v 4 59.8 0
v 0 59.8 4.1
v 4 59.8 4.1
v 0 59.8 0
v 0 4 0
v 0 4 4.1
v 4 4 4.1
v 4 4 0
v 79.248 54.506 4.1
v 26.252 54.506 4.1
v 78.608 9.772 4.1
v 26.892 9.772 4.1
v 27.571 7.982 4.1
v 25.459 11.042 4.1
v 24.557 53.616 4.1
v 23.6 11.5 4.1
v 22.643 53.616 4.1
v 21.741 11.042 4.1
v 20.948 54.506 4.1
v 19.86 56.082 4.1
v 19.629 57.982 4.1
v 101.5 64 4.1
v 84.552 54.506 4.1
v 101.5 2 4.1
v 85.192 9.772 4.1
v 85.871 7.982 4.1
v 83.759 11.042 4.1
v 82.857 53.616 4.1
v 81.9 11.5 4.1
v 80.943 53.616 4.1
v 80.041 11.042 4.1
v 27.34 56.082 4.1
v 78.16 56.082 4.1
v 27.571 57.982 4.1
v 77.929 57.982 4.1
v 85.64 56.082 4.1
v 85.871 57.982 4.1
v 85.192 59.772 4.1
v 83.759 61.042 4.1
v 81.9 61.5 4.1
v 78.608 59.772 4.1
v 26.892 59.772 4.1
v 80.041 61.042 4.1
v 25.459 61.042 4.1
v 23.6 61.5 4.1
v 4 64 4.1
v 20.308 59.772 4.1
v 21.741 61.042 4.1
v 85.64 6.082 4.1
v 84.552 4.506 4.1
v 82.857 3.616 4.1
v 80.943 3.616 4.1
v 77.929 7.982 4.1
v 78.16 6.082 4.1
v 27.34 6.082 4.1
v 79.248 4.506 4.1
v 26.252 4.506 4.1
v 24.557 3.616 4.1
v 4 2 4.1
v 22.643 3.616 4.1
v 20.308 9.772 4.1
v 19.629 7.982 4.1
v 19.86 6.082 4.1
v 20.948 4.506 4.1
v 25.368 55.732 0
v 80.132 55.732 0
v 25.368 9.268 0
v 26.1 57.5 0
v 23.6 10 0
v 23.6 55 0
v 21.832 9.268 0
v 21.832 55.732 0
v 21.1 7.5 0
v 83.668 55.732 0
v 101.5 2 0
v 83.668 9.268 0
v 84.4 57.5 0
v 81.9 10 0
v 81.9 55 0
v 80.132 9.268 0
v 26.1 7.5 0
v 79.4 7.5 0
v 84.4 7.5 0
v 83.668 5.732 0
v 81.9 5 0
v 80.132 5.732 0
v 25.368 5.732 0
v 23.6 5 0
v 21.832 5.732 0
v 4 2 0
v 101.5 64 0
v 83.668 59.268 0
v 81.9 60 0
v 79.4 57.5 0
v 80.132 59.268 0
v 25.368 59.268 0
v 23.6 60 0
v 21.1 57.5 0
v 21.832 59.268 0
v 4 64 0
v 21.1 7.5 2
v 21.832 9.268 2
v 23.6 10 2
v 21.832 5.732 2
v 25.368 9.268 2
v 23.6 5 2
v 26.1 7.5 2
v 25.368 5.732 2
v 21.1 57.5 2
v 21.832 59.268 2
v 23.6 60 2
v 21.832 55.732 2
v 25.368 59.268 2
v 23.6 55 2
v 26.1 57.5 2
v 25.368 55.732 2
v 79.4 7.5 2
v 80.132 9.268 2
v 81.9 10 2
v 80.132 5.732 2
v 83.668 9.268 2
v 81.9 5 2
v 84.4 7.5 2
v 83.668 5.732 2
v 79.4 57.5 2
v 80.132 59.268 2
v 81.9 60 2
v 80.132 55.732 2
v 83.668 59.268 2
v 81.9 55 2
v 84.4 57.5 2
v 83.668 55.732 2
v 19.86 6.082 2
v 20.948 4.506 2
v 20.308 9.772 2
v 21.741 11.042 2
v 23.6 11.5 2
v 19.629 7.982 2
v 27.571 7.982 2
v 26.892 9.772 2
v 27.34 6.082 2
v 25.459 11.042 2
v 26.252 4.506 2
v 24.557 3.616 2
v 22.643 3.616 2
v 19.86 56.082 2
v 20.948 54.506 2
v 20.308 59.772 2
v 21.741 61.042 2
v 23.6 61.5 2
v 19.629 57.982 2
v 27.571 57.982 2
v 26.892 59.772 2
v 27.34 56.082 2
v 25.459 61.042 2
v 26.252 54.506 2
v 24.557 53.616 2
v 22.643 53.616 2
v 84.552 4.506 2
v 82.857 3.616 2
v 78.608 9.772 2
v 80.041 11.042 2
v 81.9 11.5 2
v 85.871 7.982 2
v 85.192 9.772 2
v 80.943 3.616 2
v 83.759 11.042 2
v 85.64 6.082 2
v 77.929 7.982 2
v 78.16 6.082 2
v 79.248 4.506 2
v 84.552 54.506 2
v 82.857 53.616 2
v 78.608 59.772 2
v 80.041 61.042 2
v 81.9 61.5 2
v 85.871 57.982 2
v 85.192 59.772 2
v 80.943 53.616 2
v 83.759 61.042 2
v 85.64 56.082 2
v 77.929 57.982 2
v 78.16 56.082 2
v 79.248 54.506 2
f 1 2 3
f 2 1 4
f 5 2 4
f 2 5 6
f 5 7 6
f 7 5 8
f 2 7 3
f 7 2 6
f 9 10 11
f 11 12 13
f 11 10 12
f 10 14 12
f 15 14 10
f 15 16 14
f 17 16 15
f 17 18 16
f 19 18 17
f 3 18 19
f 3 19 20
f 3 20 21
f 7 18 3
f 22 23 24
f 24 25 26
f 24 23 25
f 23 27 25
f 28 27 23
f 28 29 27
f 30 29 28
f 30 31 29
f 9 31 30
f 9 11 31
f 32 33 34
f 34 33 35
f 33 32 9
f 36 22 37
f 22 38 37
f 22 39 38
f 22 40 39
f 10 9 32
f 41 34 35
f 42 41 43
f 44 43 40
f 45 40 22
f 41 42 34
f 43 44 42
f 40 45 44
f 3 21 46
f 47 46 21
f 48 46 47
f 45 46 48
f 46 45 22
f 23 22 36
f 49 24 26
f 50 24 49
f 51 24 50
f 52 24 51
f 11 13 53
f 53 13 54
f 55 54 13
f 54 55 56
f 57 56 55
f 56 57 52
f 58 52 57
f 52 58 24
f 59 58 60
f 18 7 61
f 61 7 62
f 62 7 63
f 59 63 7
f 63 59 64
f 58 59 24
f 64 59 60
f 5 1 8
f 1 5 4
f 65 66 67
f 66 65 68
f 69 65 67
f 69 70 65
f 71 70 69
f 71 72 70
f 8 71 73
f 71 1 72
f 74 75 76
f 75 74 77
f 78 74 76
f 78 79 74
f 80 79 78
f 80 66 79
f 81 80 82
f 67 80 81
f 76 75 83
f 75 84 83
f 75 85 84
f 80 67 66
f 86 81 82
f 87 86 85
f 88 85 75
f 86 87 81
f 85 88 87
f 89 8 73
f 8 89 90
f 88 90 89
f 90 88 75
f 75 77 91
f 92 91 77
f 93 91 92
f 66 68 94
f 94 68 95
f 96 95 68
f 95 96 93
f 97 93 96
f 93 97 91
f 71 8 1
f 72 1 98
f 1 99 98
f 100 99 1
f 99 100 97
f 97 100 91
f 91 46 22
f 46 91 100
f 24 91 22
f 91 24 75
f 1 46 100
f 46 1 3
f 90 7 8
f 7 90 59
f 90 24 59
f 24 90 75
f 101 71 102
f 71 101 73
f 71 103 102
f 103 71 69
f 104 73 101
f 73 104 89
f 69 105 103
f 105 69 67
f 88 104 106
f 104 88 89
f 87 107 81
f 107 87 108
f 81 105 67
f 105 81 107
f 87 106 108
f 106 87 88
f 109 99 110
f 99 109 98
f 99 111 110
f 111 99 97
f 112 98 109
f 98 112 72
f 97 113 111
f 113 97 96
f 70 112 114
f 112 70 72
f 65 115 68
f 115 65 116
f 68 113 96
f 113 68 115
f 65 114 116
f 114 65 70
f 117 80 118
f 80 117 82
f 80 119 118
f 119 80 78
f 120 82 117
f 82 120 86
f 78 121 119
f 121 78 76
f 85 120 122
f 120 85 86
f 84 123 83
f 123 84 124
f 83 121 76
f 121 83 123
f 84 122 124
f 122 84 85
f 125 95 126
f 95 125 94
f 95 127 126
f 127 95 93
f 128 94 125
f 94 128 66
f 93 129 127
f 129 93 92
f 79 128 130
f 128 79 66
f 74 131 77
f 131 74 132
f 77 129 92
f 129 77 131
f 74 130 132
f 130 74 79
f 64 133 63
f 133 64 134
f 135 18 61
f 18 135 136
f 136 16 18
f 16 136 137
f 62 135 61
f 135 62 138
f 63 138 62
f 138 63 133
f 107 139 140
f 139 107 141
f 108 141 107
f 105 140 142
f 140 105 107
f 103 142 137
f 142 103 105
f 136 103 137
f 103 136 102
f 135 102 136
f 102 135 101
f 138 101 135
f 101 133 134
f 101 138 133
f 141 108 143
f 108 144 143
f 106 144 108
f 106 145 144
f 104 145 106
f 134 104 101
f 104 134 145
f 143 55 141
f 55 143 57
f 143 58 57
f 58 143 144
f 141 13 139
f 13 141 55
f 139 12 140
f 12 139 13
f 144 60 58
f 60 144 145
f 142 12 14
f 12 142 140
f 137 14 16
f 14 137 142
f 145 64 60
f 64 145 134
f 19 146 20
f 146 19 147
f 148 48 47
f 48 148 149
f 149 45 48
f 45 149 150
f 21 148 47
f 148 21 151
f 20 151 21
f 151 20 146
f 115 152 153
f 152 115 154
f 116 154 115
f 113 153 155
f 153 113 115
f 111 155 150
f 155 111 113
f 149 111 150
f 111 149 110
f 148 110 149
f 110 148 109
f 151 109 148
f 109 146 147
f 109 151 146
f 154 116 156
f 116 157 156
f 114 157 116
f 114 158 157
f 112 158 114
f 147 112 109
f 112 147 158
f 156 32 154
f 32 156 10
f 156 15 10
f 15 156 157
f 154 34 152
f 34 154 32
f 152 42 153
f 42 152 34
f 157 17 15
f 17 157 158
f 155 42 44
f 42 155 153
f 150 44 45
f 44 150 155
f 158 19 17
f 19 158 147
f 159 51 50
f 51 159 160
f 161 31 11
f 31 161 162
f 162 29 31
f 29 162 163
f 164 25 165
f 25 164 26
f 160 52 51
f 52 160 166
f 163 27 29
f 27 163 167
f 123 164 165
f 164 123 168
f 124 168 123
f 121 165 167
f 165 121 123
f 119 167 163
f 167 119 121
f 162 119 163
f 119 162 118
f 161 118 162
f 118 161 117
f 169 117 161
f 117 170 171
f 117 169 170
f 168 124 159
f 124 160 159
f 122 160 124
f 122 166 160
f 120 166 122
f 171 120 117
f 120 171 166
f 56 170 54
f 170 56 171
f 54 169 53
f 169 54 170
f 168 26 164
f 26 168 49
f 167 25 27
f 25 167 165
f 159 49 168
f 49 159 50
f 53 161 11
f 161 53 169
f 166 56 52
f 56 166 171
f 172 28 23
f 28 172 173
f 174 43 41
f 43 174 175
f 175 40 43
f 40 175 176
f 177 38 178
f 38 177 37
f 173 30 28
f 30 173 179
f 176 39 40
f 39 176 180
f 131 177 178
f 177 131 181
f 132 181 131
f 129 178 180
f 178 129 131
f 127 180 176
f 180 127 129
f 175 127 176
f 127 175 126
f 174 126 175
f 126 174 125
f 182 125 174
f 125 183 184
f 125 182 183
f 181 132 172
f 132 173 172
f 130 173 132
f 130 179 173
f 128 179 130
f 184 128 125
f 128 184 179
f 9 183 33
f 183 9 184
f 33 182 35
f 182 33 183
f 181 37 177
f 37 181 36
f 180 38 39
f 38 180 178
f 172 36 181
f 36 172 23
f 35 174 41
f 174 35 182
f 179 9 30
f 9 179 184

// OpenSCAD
// file: Tapa.scad
batX = 0;//22.4Ancho frente
batY = 21.4;//Alto frente
batZ = 90.5;//Profundo


pared = 4;
pared2 = 2*pared;
medPared = pared/2;

raspX = 58;
raspY = 18;
raspZ = 84.5;

h = batY+pared2;

mainAreaX = raspX+batX+pared2; 
mainAreaY = batY+pared2;
mainAreaZ = batZ+pared+5+4;

mainAreaIntX = mainAreaX-pared2;
mainAreaIntY = mainAreaY-pared;
mainAreaIntZ = mainAreaZ-pared;

x1 = pared+3.5;
z1 = 23.6;
x2 = x1+50;
x3 = pared+3.5;
z3 = 81.9;

cejaHorPosX = mainAreaX-batX-pared;
cejaVertPosX = mainAreaX-pared-2;
torH = batY+pared;


rotate([90,0,90])
doALl();



module doALl(){
difference()
{
	translate([medPared,0,pared])
	doTop();	

	translate([0,-1,0])
	baseBatTorn(2.5);

	translate([0,2,0])
	baseBatTorn(4);

}
}

module doTop()
{
	translate([2,0,-4])
	cube([
			mainAreaX-pared-6.2,
			pared+0.1,
			mainAreaZ-pared2+medPared
	  	]);
	cube([
			mainAreaX-pared,
			pared+0.1,
			mainAreaZ-pared2+medPared
	  	]);
}



module baseBatTorn(r)
{
//Tornillos
translate([x1,0,z1])
tornCyl(r);
translate([x2,0,z1])
tornCyl(r);
translate([x1,0,z3])
tornCyl(r);
translate([x2,0,z3])
tornCyl(r);
}











module tornCyl(rad)
{
	rotate([-90,0,0])
	{
		cylinder(r=rad,torH);
	}
}
// file: ../../library.scad
module tubo(
	h/*Altura*/,
	w/*Pared*/,
	d/*Diametro*/
){
  difference()
  {
    cylinder(r=(d/2), h);
    translate([0,0,-0.1])
    cylinder(r=(d/2)-(2*w), h+0.2);
  }
}

module huyoMasPared(
	d/*Diametro del hoyo*/,
	w/*Pared*/,
	h/*Altura*/,
){
  difference()
  {
    cylinder(r=((d+(2*w))/2), h);
    translate([0,0,-0.1])
    cylinder(r=(d/2), h+0.2);
  }
}

module cuboMasPared(
    w1, //Largo
    w2, //Ancho
    p1, //Pared
    p2, //Pared
    h   //Alto
)
{    
    difference()
    {
        translate([-(w1+(p1*2))/2,-(w2+(p2*2))/2,0])
        cube([(w1+(p1*2)),(w2+(p2*2)),h]);
        
        translate([-w1/2,-w2/2,-0.2])
        cube([w1,w2,h*2]);
        
    }
    
    
}

soporteW = 0.7;

module soporteCylinder()
{
  difference()
  {
	cylinder(r=radio,altura);

	translate([0,0,-0.1])
	cylinder(r=radio-soporteW,altura+0.2);
  }

  if(true){
  difference()
  {
	cylinder(r=radio+0.75,1);

	translate([0,0,-0.1])
	cylinder(r=radio-0.75,1.25);
  }}

}

module soporteOval()
{
  difference()
  {
	oval(w=ancho, h=largo, height=alto, center = false);

	translate([0,0,-0.1])
	oval(ancho-soporteW, largo, alto+0.2);
  }

  difference()
  {
	oval(w=ancho+1, h=largo+1, height=1, center = false);

	translate([0,0,-0.1])
	oval(w=ancho-1, h=largo-1, height=1.25, center = false);
  }

}


module oval(w,h, height, center = false)
{
  scale([1, h/w, 1]) cylinder(h=height, r=w, center=center);
}
// file: Frame.scad
include <Diffracter.scad>

frameW = 64;
frameH = 53.5;
frameD = 2.5;

slideW = frameW - 9;
slideH = frameH - 10;
slideD = 0.8;

winW = slideW;
winH = slideH - 10;

diffW = winW+5;
diffH = winH+13;

//Frame();

module Frame()
{
difference()
{

  //translate([-frameW/2,-frameH/2,0])
  //cube([frameW,frameH,frameD]);

  areaSello();

  translate([-winW/2,-winH/2,-0.5])
  cube([winW,winH,frameD*2]);

  translate([-diffW/2,-diffH/2,frameD-0.8])
  cube([diffW,diffH,2]);

}
}


module areaSello()
{
  //cylinder(r=(raspSellR/2)-1,frameD);

  translate([-(frameW)/2,-(frameH)/2,0])
  cube([frameW,frameH,frameD]);
}
// file: Diffracter.scad
include <Tapa.scad>
include <../../library.scad>


bigW = 70;
ori = bigW/2;
raspSellR = 59;
tuboH = 140;
H = 18.5;
selloH = 7;
tornR = 2;

huecoPared = 12;
huecoH = 22;


if(false)
{
translate([0,0,H])
rotate([0,180,0])
diffracter();


//soporteCylinder(radio=25.2,altura=3.8);

}


module diffracter(){	

difference(){

//Bloque
translate([-bigW/2,-bigW/2,0])
cube([bigW,bigW,H]);


translate([
						-(bigW-huecoPared)/2,
						-(bigW-huecoPared)/2,
						(huecoH/2)
					])
		cube([
					bigW-huecoPared,
					bigW-huecoPared,
					H-huecoH]
				);


//Diffractador
translate([-27.25,-32.5,-0.1])
cube([54.5,65,5.6]);

//Macro
translate([0,0,5.4])
cylinder(r=(54.5/2),8.2);

//Sello de raspberry
//translate([0,0,-0.1])
//cylinder(r=(raspSellR/2)+1,2);

//Tubo
//translate([0,0,-0.1])
//cylinder(r=(52/2),200);

//Tornillos abajo
translate([-ori+4,-ori+4,-0.1])
cylinder(r=tornR,20);
translate([ori-4,-ori+4,-0.1])
cylinder(r=tornR,20);
translate([-ori+4,ori-4,-0.1])
cylinder(r=tornR,20);
translate([ori-4,ori-4,-0.1])
cylinder(r=tornR,20);

//Hueco
cylinder(r=25.5,H+1);

//Tornillos caja
translate([0,0,(tuboH/2)-7])
rotate([0,90,0])
tornillosArriba();

//Tornillo tripie
translate([-ori-0.1,0,(tuboH/2)+7])
rotate([0,90,0])
cylinder(r=5/2,5.31);

//Sello hembra
translate([0,0,H-3])
cylinder(r=30,4);

}

//Sello cobertura
//translate([0,0,H-1])
//huyoMasPared(58,3,3);


}
// main file
include <Diffracter.scad>
include <Frame.scad>
include <../../library.scad>
// 3.15° for every 100 l/mm




//-- Cono
//cylinder (r1 = 20, r2 = 0, h = 20, $fn = 100);

angulo = 31.5;

coberW = bigW+6;
coberH = 6;
coberOffset = 2.3;//Posición del tubo
coberOffset2 = -7;//Altura del tubo
cobeSellH = 4;
cobeSellW1 = 7;
cobeSellW2 = 7;

torrRadio = 2;

tuboH = 140;
tuboRadio = 30;
tuboConoH = 25;


if(false)
{
  creaTubo();
}

//soporteCylinder(radio=29,altura=coberH);	
//soporteOval(ancho=28, largo=25, alto=coberH);
//soporteCylinder(radio=34,altura=coberH);
//frameSello();

module creaTubo()
{
 difference()
 {
 areaExterna();

 //Cuadro de la pared
 //creaContorno();
 translate([-(bigW+2)/2,-(bigW+2)/2,-40+coberH-3])
 cube([bigW+2,bigW+2,40]);

 //Tornillos
 tornPass();

 //Hueco
 translate([0,0,-0.1])
 cylinder(r=tuboRadio-3,tuboH+0.2);

 }



 //TuboExterno
 difference()
 {
  cylinder(r=tuboRadio,tuboH);
  
  translate([0,0,-0.1])
  cylinder(r=tuboRadio-3,tuboH+0.2);
 }


 difference()
 {

 //Cuadro
 translate([0,0,tuboH-8])
 areaSelloCono()

 //Hueco
 //translate([0,0,tuboH-20])
 //cylinder(r=tuboRadio-3,30);

 //Hace cuadrado el cono
 translate([0,0,tuboH-40])
 rectanculando();

 //Tornillos
 translate([0,0,tuboH-20])
 tornPass();

 //Cobertura
 translate([-(bigW+1.5)/2,-(bigW+1.5)/2,tuboH-4])
 cube([bigW+1.5,bigW+1.5,40]);

 }

}


module rectanculando()
{
	translate([-130/2,-68,0])
	cube([130,30,50]);

	translate([-130/2,38,0])
	cube([130,30,50]);

	translate([-68,-70,0])
	cube([30,130,50]);

	translate([38,-70,0])
	cube([30,130,50]);
}

module areaSelloCono()
{

translate([-coberW/2,-coberW/2,0])
cube([coberW,coberW,8]);

//translate([0,0,-tuboConoH+4])
//cylinder (r1 = tuboRadio, r2 = 38, h = tuboConoH, $fn = 100);

}



//creaSelloMacho();






module creaContorno()
{

 difference()
 {
   translate([-(coberW-4.5)/2,-(coberW-4.5)/2,-3])
   cube([(coberW-4.5),(coberW-4.5),coberH]);

   translate([-(coberW-16)/2,-(coberW-25)/2,-3])
   cube([(coberW-16),(coberW-25),coberH]);
 }

/*
 translate([-(coberW-6)/2,-(coberW-6)/2,-3])
 cube([(coberW-6),8.8,coberH]);

 translate([-(coberW-5)/2,((coberW-5)/2)-8.5,-3])
 cube([(coberW-5),10,coberH]);

 translate([(-(coberW-5)/2),-((coberW-6)/2),-3])
 cube([5.5,(coberW-6),coberH]);

 translate([((coberW-5.5)/2)-5,-((coberW-6)/2),-3])
 cube([5.5,(coberW-6),coberH]);
*/
}



module creaSelloMacho()
{

 translate([0,0,coberH-cobeSellH])
 difference()
 {
  areaSello(frameD=cobeSellH);

  translate([-(frameW-cobeSellW1)/2,-(frameH-cobeSellW2)/2,-0.1])
  cube([frameW-cobeSellW1,frameH-cobeSellW2,cobeSellH+1]);
 }
}

module areaExterna()
{
//Cobertura
translate([-coberW/2,-coberW/2,0])
cube([coberW,coberW,coberH]);

}

module recorteOval()
{
  translate([-0.4,0,-1.9])
  oval(26.8,22.9, 15, center = false);
}

module tornPass()
{
translate([-ori+4,-ori+4,-0.1])
cylinder(r=torrRadio,30);
translate([ori-4,-ori+4,-0.1])
cylinder(r=torrRadio,30);
translate([-ori+4,ori-4,-0.1])
cylinder(r=torrRadio,30);
translate([ori-4,ori-4,-0.1])
cylinder(r=torrRadio,30);
}
